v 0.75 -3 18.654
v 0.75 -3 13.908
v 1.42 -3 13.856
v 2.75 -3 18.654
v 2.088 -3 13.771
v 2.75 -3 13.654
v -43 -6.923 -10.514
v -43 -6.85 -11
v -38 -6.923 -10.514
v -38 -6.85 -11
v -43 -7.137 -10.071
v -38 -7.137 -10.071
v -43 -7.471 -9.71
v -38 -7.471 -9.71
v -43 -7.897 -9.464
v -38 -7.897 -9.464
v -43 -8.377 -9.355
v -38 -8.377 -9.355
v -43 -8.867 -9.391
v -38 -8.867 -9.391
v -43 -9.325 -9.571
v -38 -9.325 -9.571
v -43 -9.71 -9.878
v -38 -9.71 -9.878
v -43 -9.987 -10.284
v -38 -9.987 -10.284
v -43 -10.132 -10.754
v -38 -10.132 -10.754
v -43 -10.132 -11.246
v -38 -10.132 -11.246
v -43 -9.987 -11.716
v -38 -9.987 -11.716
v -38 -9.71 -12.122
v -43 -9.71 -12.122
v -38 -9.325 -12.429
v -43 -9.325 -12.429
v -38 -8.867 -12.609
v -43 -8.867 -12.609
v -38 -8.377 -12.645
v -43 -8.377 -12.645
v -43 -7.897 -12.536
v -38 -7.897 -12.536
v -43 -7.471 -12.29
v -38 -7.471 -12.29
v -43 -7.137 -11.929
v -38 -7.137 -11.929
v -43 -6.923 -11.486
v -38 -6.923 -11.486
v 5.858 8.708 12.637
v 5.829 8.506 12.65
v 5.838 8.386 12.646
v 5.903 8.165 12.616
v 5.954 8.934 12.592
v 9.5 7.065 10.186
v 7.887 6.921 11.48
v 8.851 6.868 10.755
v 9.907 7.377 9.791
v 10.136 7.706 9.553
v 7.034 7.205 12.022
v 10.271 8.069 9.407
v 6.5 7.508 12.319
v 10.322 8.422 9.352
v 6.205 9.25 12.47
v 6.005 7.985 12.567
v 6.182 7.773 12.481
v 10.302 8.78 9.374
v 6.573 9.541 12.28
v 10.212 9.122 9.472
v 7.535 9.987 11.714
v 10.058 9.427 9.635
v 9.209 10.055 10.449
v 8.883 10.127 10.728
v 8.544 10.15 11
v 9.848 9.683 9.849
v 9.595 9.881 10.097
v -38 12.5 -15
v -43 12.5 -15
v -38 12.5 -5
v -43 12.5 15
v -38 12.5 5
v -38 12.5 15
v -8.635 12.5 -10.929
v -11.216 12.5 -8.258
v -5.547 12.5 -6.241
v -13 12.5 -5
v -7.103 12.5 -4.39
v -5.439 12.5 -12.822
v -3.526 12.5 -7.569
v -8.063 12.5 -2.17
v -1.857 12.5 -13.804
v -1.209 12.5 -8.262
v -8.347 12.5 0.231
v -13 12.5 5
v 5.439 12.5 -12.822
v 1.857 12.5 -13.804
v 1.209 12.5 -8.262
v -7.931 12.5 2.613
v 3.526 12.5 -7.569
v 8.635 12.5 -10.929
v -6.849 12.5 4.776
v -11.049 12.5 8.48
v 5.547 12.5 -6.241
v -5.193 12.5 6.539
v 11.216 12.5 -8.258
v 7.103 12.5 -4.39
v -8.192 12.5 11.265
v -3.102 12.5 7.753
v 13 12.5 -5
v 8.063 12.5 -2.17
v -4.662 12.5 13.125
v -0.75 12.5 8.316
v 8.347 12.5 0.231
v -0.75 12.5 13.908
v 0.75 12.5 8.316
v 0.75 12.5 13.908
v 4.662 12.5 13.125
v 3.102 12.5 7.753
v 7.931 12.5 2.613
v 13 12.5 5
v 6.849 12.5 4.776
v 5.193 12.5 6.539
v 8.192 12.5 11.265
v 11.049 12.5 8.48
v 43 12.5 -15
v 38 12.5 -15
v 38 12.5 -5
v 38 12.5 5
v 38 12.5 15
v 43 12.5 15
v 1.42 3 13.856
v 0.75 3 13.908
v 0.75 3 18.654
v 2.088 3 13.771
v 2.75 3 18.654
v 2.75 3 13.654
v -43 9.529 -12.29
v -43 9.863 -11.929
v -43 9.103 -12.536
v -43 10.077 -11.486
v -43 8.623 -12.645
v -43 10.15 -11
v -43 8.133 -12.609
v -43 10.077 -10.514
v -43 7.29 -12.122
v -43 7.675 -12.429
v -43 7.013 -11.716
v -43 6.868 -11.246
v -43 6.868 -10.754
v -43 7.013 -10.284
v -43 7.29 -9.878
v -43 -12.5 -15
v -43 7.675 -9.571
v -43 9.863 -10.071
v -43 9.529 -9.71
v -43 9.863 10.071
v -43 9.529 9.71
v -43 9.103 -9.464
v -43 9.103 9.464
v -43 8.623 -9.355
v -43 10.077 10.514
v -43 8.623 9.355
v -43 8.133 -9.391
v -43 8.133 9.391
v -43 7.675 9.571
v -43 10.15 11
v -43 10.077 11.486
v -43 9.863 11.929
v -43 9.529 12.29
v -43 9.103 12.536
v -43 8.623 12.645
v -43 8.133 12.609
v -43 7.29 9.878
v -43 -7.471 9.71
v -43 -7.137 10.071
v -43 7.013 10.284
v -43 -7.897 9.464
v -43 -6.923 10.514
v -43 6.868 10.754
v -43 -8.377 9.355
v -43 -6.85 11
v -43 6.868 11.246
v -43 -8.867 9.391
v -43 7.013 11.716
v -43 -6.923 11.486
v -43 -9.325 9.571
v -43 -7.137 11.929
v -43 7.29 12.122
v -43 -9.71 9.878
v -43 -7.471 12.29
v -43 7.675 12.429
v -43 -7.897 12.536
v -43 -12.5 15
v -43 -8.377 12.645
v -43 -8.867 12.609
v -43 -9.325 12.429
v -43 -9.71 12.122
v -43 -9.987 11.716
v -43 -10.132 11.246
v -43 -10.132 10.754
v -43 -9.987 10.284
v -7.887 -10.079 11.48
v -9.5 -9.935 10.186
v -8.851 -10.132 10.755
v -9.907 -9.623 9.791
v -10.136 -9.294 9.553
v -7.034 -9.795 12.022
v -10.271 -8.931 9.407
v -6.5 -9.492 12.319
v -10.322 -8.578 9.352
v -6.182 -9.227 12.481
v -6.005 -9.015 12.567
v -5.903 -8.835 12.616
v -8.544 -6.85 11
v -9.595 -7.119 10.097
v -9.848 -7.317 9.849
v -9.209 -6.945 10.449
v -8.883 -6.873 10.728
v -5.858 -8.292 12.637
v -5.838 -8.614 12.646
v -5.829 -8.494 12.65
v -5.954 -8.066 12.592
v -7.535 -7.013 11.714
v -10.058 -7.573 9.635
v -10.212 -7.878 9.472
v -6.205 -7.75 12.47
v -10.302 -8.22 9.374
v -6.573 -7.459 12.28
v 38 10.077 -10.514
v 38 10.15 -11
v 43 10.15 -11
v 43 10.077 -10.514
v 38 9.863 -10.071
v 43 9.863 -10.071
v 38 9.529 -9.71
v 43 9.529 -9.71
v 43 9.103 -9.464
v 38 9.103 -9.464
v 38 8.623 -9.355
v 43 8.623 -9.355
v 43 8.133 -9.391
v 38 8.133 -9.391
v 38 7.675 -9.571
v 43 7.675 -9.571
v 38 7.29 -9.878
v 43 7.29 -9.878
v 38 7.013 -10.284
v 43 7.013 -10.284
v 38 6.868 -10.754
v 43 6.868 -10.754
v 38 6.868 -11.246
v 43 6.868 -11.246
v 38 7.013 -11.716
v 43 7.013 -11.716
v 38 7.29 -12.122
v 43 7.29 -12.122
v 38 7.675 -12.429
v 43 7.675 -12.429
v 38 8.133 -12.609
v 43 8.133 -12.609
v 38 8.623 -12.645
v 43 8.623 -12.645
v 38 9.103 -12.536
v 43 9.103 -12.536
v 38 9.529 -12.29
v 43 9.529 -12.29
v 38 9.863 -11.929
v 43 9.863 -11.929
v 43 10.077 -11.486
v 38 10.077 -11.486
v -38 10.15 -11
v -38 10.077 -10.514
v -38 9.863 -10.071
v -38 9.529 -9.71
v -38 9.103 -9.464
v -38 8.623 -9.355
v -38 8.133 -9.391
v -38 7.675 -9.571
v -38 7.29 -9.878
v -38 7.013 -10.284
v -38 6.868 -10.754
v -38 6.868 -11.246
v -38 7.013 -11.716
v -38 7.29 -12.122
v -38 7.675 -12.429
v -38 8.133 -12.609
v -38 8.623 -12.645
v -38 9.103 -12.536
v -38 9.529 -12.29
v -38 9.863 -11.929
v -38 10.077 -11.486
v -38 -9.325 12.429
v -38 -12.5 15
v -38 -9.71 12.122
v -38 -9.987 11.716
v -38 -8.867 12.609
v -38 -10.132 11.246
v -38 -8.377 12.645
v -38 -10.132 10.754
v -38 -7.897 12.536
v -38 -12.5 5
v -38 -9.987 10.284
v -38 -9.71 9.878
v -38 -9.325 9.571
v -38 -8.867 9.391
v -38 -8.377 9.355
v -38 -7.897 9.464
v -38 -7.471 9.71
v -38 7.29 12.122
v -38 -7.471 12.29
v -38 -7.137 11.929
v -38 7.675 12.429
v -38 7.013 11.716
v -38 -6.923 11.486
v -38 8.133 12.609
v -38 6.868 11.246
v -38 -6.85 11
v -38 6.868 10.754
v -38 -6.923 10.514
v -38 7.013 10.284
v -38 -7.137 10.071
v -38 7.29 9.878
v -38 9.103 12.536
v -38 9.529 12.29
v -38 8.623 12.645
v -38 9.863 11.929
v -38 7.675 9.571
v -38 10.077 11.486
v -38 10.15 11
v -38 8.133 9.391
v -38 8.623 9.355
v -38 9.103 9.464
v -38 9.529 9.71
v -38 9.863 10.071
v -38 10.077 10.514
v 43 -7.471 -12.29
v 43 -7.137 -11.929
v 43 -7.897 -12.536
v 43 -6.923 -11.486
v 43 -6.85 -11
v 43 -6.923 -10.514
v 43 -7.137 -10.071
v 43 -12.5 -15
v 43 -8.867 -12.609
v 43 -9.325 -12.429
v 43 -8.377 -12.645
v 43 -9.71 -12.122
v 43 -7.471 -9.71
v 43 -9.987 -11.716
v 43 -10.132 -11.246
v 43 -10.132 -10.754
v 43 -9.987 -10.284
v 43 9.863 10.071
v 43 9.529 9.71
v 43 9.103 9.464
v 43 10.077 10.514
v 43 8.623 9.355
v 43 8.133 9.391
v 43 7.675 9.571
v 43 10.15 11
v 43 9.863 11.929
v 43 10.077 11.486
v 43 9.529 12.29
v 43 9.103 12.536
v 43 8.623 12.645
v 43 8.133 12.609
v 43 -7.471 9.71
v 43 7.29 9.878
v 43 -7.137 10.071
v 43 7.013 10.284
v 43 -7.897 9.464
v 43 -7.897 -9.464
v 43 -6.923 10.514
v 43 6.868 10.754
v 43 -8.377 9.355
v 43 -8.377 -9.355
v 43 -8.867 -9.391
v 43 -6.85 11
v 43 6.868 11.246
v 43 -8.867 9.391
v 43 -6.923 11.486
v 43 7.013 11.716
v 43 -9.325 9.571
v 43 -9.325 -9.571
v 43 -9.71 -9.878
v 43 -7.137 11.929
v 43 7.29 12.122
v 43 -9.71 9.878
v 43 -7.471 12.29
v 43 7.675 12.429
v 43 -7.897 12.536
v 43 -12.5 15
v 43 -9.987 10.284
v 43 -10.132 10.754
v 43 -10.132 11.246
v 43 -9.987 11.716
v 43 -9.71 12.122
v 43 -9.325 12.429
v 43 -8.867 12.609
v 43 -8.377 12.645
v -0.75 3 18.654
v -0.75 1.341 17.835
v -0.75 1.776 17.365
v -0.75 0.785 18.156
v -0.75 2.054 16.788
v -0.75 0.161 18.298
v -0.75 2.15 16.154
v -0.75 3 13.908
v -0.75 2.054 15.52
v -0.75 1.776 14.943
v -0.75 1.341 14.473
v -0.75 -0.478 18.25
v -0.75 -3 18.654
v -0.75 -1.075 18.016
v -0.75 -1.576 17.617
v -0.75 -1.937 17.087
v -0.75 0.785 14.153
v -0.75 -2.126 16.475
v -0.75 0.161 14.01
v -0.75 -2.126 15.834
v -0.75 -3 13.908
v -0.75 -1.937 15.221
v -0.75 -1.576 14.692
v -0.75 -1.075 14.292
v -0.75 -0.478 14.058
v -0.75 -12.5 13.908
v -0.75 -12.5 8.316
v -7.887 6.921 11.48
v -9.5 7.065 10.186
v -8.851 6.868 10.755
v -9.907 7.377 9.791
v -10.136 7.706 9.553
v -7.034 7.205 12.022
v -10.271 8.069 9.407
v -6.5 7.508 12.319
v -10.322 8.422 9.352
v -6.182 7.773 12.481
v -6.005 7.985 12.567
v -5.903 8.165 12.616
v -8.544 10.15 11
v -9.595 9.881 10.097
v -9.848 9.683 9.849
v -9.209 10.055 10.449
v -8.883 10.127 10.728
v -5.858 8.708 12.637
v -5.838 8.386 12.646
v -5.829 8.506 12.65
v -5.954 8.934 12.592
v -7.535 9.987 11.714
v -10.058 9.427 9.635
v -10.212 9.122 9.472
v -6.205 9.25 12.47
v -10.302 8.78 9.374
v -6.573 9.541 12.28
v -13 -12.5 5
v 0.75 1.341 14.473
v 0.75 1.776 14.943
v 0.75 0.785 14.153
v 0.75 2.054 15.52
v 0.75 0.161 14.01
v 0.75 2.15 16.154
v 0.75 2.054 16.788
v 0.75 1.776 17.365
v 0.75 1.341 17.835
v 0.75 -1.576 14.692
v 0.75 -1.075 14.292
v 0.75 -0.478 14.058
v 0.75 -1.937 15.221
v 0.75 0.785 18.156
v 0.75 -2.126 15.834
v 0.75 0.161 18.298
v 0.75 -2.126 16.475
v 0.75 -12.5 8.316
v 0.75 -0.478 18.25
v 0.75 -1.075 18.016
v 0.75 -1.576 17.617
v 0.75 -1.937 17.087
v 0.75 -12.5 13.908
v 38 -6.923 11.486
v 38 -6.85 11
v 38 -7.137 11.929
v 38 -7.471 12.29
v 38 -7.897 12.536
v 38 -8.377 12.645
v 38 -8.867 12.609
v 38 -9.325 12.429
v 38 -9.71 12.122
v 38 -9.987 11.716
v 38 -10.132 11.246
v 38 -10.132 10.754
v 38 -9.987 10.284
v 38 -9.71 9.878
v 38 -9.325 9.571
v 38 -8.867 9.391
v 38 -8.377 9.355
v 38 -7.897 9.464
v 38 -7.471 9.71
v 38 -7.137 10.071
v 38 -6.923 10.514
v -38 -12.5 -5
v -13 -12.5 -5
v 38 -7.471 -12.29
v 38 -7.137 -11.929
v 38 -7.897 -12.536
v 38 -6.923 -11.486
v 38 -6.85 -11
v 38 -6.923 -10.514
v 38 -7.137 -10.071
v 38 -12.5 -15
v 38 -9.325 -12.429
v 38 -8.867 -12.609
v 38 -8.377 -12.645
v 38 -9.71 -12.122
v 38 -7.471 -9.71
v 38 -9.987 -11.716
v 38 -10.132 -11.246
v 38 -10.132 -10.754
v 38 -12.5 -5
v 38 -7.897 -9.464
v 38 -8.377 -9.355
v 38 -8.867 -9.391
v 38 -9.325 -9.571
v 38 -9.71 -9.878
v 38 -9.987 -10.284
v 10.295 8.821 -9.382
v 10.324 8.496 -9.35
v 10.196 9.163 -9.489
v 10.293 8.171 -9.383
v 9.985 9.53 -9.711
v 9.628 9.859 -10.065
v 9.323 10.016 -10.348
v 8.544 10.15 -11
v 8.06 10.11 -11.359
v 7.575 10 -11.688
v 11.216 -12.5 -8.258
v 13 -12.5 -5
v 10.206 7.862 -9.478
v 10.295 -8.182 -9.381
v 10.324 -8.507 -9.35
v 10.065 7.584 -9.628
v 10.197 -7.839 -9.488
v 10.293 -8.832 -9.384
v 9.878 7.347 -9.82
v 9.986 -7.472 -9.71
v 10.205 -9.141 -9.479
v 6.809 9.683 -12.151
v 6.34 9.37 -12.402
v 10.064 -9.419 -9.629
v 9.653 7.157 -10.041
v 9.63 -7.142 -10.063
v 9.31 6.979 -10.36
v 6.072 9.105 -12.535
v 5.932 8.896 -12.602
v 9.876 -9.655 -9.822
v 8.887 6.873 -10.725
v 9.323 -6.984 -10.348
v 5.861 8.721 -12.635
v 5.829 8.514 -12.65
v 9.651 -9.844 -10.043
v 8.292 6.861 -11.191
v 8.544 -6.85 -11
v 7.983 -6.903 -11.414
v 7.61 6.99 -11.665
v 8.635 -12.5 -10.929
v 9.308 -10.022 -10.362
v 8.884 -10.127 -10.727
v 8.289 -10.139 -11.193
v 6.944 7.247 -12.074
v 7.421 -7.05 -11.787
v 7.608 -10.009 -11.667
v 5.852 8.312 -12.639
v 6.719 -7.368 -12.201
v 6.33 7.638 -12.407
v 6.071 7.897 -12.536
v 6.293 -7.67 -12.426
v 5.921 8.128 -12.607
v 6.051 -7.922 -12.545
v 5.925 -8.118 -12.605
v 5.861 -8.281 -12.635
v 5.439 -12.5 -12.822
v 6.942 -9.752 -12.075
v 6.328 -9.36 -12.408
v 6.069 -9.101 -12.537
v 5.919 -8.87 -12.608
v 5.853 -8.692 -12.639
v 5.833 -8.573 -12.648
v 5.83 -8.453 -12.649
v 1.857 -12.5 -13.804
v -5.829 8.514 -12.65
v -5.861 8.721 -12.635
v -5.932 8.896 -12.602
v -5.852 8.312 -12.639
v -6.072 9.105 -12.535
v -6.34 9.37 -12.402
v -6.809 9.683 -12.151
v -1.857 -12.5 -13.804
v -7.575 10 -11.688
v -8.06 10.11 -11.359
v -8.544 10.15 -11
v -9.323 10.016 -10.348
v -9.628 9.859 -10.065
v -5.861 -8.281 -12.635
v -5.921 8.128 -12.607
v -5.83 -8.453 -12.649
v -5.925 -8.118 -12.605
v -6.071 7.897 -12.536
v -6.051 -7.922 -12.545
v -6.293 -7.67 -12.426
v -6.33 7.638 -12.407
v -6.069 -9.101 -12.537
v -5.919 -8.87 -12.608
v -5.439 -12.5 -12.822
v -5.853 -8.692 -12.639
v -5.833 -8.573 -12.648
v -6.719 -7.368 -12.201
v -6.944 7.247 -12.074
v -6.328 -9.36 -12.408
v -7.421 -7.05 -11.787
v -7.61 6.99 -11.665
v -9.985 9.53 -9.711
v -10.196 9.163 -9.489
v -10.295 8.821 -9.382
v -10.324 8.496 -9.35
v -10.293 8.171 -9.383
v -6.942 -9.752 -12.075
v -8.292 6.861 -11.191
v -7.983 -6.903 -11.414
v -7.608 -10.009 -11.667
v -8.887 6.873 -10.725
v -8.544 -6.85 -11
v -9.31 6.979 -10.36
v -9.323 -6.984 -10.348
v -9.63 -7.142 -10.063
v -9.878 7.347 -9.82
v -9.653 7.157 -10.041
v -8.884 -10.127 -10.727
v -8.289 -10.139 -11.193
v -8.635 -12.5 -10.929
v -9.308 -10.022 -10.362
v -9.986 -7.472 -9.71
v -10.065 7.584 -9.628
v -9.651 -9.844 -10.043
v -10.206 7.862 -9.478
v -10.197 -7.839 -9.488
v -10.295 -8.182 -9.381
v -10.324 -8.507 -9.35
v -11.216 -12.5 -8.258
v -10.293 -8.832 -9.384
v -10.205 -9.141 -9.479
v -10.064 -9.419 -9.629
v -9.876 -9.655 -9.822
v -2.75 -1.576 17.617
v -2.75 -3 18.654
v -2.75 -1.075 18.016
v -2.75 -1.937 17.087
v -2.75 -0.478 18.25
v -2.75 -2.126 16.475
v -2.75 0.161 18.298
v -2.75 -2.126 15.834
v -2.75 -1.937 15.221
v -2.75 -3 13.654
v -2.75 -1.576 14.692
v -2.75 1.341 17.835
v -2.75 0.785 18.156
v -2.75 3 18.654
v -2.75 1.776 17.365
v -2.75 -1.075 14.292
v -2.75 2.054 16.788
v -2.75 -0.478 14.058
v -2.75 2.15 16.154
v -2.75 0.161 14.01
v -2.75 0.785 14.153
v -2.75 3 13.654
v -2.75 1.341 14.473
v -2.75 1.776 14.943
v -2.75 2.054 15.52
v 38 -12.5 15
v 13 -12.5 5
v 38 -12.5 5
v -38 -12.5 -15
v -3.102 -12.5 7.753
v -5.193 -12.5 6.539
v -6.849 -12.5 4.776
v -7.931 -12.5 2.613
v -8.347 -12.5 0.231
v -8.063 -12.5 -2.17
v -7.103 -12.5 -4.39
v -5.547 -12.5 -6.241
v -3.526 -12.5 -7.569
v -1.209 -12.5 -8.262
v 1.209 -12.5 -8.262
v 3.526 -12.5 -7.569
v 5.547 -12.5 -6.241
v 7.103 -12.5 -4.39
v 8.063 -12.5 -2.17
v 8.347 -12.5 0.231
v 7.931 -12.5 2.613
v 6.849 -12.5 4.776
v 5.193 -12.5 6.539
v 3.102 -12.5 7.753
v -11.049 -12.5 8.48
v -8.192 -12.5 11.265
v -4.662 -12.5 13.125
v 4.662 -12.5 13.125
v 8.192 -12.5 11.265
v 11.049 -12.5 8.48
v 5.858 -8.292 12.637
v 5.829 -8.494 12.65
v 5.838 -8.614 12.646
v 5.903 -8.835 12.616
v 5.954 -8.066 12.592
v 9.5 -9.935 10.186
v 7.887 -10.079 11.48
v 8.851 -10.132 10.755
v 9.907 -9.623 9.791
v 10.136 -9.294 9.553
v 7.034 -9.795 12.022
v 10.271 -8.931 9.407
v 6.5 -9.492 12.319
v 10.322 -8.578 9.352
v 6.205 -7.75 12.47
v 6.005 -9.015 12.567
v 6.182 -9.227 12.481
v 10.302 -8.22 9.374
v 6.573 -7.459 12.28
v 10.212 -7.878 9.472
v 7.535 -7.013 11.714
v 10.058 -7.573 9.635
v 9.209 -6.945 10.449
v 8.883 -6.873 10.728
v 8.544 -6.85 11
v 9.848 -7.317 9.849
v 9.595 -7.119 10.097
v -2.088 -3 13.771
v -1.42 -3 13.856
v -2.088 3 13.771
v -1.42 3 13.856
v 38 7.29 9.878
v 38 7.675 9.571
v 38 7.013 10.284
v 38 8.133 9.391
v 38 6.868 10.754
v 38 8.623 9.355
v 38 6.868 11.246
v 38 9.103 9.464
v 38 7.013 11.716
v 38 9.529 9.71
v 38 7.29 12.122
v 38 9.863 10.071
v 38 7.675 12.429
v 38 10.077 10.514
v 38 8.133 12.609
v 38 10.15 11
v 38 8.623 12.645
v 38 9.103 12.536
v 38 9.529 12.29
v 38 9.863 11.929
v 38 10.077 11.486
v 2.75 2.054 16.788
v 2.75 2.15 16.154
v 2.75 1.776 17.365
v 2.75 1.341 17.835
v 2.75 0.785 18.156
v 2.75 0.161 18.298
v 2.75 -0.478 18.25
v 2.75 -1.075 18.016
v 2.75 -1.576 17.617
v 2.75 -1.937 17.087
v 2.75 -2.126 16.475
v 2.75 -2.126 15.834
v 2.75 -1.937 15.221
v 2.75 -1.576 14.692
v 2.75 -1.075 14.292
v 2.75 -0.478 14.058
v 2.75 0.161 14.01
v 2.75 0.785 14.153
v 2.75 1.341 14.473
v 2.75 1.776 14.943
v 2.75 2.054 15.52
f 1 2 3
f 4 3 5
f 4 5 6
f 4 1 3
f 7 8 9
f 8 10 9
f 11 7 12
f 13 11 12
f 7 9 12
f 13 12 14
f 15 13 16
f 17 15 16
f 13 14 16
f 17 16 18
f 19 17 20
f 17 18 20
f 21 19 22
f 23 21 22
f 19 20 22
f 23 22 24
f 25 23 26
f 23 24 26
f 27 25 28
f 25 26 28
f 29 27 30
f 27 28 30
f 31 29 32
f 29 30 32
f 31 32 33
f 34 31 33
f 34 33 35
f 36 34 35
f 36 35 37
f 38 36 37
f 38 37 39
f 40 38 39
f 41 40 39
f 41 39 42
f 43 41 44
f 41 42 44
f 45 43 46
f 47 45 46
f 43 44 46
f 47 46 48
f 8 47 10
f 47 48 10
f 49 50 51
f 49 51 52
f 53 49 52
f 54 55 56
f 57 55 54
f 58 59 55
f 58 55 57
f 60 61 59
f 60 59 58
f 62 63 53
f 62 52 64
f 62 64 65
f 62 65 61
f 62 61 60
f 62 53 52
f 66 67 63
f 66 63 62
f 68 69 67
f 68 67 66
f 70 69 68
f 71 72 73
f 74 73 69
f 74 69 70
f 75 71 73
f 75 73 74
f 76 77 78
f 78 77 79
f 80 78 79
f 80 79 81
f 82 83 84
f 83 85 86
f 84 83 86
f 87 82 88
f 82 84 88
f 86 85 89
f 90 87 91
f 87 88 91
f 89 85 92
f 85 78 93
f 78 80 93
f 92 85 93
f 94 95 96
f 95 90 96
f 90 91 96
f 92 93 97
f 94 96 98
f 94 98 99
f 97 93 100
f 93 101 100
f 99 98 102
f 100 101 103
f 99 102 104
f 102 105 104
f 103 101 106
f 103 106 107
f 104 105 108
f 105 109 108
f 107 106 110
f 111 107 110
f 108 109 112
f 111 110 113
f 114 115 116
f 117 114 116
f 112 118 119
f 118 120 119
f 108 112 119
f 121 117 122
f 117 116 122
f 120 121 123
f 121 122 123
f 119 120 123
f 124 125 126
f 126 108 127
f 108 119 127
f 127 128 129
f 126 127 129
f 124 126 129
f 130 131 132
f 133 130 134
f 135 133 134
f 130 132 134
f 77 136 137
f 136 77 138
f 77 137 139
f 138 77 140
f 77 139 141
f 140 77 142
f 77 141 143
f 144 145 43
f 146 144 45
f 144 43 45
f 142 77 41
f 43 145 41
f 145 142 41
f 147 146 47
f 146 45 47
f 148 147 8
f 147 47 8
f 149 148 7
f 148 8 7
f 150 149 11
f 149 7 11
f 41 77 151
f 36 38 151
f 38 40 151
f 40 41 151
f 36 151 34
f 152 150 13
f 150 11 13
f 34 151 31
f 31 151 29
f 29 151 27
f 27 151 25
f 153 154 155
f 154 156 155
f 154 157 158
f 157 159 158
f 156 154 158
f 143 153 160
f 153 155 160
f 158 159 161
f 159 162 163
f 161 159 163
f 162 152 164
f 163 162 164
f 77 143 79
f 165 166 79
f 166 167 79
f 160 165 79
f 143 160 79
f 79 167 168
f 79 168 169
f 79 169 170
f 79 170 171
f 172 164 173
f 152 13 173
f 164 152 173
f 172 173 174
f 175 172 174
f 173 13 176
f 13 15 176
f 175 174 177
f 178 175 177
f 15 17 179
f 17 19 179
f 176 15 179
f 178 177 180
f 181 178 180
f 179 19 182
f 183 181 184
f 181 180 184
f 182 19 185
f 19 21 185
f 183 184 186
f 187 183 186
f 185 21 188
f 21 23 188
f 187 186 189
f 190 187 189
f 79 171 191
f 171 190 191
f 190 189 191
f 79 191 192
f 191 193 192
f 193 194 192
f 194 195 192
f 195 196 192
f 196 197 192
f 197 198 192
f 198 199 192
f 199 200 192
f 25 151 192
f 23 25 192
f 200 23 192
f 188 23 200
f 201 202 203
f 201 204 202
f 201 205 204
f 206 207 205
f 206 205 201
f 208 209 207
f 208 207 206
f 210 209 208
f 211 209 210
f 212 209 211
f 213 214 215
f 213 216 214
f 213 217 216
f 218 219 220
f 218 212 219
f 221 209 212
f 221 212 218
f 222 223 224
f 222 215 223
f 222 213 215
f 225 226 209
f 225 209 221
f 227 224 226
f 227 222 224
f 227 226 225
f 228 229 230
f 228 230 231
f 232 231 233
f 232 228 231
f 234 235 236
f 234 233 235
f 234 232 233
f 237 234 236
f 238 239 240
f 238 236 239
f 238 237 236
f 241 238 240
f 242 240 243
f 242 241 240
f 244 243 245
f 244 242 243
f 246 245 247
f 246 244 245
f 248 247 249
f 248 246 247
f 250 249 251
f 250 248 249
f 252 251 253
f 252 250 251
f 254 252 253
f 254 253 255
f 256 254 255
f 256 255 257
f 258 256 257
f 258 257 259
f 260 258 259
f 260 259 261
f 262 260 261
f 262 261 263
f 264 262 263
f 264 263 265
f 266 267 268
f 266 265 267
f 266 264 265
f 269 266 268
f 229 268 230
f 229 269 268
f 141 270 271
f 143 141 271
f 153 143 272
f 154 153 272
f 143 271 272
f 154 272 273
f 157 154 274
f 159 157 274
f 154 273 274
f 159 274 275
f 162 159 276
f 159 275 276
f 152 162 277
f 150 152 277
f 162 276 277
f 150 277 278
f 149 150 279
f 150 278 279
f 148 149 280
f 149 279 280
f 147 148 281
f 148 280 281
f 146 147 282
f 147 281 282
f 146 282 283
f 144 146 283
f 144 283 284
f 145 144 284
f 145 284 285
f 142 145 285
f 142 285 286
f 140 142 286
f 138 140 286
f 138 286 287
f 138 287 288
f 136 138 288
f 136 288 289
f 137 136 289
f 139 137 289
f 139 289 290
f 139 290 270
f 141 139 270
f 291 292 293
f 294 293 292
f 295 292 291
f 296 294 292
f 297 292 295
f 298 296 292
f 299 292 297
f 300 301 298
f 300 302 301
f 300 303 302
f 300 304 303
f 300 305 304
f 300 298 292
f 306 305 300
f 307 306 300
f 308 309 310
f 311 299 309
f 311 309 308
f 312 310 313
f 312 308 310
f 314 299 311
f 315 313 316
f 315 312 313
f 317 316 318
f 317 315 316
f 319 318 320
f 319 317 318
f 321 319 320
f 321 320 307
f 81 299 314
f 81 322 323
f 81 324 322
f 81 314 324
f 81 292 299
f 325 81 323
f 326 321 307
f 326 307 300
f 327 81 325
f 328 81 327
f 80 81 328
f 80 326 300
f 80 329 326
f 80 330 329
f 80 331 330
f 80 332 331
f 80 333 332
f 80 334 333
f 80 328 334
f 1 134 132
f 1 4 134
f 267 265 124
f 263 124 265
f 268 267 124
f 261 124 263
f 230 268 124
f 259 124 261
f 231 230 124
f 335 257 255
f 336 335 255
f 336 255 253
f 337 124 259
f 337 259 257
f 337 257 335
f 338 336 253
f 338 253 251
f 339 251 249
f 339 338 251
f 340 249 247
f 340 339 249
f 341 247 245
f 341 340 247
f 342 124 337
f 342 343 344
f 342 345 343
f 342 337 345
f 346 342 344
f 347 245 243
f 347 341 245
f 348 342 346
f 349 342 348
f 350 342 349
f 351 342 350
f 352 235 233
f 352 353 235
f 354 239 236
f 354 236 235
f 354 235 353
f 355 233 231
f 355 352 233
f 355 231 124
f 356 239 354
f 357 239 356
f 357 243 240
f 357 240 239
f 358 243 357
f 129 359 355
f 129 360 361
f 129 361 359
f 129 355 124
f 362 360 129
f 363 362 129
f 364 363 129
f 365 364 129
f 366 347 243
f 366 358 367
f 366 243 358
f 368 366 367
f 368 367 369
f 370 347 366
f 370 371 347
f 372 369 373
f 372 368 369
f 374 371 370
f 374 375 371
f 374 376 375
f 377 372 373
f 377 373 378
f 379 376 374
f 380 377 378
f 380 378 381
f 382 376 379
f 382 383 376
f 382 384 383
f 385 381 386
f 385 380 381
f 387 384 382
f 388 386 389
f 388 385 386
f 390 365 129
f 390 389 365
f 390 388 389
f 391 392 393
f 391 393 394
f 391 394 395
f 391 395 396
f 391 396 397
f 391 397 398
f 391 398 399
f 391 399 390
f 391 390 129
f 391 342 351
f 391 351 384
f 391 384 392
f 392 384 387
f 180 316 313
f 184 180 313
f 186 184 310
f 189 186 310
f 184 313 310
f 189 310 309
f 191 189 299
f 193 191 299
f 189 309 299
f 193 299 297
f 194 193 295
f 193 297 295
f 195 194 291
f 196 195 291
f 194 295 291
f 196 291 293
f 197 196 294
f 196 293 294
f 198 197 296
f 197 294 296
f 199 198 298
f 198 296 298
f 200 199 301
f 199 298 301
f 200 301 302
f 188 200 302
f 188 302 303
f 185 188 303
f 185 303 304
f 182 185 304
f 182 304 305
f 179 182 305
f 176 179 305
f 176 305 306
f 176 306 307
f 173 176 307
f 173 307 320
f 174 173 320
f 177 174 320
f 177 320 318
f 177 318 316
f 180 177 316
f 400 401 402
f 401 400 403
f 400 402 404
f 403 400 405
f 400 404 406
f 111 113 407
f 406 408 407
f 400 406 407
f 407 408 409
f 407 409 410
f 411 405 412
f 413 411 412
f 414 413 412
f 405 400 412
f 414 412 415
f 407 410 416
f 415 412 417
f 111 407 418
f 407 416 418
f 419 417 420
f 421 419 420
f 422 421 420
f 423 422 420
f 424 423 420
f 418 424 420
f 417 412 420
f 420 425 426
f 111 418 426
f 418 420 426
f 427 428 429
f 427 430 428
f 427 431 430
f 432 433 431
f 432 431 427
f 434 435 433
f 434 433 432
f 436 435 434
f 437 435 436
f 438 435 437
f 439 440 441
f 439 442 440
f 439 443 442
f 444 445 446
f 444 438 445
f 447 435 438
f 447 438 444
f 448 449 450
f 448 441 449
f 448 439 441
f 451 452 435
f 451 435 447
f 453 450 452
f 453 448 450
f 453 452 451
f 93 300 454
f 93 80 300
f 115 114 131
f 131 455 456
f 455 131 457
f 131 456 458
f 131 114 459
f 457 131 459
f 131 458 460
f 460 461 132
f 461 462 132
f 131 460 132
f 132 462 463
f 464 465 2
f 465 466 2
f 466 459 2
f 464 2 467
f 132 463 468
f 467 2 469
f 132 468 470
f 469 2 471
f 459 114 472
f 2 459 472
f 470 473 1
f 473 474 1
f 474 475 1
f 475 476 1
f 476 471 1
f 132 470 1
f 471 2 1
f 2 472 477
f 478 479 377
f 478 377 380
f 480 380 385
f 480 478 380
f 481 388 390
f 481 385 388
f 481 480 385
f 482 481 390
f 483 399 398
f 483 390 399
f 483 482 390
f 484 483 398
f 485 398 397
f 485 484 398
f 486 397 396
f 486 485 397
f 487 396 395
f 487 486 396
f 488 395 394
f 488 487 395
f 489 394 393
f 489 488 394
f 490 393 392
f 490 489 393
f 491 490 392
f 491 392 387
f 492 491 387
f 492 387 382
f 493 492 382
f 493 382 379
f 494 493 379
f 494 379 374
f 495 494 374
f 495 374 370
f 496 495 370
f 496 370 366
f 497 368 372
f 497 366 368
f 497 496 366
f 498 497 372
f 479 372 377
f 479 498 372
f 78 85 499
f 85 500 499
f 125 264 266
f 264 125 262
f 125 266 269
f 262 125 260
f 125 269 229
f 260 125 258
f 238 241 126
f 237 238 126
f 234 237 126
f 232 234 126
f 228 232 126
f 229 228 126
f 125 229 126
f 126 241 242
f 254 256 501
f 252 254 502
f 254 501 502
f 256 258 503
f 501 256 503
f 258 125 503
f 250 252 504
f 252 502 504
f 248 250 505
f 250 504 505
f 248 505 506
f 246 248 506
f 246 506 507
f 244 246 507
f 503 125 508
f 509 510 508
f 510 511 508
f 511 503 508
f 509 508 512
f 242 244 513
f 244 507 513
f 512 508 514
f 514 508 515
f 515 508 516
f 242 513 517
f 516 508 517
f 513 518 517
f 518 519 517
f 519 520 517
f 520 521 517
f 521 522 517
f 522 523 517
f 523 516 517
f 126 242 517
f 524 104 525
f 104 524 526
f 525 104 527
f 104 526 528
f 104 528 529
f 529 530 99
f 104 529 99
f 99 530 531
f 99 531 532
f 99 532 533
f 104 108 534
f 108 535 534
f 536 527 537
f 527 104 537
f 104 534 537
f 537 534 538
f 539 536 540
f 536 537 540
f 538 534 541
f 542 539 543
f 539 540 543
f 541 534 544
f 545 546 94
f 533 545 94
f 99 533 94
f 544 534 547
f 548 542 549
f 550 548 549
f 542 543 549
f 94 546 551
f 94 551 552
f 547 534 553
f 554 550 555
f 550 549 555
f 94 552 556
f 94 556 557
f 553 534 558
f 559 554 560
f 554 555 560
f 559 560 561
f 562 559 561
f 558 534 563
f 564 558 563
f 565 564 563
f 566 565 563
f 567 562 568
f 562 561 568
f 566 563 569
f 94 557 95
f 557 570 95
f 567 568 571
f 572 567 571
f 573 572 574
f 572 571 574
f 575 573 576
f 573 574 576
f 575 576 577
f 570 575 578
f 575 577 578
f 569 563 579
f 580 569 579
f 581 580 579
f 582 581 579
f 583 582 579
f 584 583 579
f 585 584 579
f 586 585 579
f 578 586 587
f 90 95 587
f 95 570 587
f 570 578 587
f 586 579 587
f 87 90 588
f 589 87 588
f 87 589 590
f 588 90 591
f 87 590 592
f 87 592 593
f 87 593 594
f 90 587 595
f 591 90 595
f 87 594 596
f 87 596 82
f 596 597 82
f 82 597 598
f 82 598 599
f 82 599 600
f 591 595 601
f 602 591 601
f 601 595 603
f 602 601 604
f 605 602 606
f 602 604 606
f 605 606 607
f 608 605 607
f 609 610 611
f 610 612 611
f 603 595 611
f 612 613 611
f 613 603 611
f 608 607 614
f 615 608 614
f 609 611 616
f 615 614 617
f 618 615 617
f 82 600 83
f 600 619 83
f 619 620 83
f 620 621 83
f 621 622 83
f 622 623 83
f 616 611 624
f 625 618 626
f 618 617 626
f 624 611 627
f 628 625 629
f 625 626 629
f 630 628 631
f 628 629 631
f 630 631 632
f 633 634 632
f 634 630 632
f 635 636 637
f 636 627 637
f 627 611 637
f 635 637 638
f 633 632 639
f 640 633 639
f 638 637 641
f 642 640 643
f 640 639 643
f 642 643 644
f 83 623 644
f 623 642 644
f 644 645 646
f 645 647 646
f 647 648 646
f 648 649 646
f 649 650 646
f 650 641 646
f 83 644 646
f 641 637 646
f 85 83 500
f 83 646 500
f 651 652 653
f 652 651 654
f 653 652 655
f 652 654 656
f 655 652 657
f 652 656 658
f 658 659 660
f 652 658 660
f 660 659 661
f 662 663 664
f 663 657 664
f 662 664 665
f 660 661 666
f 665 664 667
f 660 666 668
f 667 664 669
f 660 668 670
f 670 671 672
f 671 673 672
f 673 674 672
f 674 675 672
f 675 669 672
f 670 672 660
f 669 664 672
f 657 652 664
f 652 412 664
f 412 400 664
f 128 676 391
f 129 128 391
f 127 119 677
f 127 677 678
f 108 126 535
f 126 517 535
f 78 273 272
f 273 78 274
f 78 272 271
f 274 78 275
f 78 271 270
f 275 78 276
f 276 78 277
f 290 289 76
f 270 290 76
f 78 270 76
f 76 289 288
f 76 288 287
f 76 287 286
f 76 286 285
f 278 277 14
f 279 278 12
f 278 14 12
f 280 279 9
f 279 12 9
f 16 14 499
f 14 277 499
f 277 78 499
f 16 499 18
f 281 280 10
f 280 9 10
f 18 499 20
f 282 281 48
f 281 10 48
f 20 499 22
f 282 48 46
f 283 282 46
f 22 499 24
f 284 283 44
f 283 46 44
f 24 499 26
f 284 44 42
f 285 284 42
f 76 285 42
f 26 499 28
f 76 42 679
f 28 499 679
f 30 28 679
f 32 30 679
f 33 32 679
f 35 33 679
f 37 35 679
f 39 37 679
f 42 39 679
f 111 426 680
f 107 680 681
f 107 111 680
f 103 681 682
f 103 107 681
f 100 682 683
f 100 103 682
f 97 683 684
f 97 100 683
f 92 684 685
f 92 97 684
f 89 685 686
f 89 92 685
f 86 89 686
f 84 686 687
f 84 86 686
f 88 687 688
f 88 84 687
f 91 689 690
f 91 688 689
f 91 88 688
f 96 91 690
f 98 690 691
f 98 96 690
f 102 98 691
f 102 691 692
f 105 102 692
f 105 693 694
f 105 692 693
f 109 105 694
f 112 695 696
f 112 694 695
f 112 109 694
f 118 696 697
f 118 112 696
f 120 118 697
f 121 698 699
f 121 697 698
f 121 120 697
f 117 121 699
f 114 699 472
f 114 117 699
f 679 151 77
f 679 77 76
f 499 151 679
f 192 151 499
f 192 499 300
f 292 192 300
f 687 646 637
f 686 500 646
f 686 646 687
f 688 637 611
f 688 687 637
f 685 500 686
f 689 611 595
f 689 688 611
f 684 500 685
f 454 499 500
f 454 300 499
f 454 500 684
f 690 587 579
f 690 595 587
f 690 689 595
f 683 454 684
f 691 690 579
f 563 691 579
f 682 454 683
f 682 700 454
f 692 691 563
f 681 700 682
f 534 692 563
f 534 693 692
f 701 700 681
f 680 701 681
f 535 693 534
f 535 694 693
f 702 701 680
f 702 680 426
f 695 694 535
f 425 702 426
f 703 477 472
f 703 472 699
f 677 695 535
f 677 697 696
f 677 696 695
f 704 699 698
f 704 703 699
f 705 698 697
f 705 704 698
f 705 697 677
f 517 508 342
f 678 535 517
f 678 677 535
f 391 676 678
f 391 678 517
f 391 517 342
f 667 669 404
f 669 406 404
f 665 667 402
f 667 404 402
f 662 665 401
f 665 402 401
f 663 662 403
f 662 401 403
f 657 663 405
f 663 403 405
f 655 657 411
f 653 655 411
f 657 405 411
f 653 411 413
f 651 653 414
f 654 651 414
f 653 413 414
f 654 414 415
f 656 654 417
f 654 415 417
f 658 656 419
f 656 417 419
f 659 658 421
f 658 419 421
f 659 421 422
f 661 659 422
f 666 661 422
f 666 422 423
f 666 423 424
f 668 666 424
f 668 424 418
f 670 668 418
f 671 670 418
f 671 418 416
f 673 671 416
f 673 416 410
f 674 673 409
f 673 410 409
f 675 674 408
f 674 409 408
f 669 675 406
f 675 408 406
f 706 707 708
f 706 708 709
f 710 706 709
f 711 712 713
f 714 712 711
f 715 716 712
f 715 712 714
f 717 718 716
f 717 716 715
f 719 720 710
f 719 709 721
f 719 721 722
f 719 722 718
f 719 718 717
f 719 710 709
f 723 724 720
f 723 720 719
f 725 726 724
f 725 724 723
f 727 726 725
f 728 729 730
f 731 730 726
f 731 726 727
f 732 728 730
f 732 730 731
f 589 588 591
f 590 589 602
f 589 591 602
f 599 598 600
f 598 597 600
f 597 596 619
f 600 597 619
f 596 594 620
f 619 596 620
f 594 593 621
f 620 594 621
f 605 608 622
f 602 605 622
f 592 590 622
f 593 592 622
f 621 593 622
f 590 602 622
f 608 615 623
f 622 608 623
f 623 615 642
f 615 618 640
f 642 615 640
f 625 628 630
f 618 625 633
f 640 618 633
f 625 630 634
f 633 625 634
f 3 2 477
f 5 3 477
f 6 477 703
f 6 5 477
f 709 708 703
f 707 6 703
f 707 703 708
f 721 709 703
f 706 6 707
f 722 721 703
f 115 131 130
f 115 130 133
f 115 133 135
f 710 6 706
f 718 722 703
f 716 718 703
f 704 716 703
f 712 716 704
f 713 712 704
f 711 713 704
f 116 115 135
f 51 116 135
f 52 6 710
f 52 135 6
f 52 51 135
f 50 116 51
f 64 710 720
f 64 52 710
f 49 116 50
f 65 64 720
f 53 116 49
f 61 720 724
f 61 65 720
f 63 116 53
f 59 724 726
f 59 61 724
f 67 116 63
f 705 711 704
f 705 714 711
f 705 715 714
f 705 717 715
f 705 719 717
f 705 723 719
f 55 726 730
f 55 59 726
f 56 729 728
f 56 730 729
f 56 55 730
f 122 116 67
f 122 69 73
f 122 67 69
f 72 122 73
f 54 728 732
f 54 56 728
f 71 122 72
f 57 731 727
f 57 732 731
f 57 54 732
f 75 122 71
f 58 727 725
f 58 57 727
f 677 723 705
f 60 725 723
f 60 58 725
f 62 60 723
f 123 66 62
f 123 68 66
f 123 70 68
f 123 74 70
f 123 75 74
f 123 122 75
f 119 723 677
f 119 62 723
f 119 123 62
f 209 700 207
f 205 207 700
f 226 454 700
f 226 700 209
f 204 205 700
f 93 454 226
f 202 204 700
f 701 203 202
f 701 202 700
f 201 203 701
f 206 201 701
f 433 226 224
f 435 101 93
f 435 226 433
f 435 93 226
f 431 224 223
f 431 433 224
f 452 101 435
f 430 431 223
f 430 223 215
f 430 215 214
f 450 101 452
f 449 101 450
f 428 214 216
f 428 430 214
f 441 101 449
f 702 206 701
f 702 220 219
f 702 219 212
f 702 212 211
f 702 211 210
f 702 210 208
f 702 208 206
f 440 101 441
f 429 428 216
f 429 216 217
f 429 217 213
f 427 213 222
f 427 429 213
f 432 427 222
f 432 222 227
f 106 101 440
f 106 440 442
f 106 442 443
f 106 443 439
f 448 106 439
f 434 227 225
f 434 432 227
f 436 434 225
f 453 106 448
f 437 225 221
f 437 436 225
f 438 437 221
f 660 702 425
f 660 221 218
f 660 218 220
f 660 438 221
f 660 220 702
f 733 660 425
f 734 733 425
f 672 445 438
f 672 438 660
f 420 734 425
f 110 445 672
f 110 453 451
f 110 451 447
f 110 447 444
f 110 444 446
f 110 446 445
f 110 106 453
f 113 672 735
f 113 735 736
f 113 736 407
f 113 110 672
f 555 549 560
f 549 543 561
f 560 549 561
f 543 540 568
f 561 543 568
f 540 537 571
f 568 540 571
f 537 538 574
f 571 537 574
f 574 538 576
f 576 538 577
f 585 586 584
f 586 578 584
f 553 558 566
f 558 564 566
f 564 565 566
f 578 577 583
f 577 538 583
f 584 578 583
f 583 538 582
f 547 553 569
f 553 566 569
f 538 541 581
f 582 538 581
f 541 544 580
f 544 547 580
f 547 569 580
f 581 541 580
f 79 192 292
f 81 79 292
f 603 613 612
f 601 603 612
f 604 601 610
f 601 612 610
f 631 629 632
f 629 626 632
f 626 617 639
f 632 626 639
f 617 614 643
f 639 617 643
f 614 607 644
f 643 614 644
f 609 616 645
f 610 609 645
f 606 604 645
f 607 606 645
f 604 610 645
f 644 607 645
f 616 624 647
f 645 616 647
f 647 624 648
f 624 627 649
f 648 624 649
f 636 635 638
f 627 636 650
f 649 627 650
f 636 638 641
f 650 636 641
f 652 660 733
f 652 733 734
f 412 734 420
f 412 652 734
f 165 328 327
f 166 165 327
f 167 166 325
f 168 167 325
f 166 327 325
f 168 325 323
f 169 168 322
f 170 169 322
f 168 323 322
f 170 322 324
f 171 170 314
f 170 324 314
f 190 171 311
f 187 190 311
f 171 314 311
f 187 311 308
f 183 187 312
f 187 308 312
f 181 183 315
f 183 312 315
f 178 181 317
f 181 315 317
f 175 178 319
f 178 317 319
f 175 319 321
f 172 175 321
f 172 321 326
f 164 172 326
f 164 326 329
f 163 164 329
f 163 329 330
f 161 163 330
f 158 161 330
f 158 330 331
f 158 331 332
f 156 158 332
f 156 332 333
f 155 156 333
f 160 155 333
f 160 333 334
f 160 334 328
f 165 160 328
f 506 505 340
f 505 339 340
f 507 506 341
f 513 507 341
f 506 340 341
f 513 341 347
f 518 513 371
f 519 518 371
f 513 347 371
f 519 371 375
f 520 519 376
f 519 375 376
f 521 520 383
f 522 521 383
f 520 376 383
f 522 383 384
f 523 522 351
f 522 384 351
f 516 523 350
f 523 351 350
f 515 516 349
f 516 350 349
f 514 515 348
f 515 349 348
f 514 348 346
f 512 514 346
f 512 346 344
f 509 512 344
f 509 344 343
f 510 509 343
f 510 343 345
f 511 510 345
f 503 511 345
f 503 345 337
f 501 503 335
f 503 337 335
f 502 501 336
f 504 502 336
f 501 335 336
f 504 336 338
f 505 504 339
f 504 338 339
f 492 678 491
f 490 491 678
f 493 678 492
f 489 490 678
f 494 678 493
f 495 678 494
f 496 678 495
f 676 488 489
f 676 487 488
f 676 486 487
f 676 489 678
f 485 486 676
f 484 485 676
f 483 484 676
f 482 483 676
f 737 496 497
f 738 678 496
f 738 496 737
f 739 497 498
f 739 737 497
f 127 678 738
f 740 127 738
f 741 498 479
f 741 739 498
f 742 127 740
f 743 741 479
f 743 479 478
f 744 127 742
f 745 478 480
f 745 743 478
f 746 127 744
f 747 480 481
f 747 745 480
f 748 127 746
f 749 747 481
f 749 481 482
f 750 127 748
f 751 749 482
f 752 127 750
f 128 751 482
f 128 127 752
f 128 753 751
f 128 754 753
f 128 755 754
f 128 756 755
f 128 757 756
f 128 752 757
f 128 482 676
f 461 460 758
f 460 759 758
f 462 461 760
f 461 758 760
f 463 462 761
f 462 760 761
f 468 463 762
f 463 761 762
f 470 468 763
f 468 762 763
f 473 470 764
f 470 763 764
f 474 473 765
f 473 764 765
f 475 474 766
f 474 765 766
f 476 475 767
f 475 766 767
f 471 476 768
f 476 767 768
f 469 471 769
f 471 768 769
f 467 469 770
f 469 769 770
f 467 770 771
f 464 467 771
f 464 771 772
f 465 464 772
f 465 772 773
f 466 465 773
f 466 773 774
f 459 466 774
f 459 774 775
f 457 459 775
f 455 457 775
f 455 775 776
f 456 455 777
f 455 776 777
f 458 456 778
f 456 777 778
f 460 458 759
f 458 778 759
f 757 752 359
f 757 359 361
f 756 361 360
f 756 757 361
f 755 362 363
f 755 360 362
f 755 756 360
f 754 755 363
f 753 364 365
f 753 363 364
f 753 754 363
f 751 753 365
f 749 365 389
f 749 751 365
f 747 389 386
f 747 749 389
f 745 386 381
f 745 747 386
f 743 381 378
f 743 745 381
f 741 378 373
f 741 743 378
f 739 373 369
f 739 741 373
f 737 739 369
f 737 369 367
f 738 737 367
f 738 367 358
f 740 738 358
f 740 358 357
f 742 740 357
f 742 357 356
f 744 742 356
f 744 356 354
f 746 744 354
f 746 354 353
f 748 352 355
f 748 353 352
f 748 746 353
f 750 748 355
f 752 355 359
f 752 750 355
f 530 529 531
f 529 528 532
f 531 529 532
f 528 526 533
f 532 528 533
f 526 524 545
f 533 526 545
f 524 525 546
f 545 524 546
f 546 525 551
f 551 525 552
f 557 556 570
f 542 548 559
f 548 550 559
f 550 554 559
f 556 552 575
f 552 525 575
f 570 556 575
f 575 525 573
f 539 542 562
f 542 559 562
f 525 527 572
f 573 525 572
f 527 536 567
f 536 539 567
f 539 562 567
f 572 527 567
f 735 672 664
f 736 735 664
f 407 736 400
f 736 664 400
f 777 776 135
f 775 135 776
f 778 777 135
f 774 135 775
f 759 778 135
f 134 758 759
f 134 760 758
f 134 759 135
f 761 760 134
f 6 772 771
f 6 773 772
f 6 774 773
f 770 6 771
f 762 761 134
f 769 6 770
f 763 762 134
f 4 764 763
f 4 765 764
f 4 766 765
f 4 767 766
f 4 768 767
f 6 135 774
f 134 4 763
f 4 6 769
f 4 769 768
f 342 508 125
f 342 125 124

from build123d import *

# Parameters (mm, degrees)
F0_W      = 86
F0_H      = 30
F0_R      = 8.35
F1_DEPTH  = 12.5
F3_DEPTH  = 12.5
F4_R      = 1.65
F5_DEPTH  = 65
F6_R      = 1.65
F7_DEPTH  = 12.5
F9_DEPTH  = 12.5
F11_DEPTH = 12.5
F13_DEPTH = 3
F14_R     = 2.15
F15_DEPTH = 12.5


with BuildPart() as f1:
    # F0 (on Front) → F1 (new body, symmetric)
    with BuildSketch(Plane.XZ):
        Rectangle(F0_W, F0_H)
        Circle(F0_R, mode=Mode.SUBTRACT)
    extrude(amount=F1_DEPTH, both=True)

    # F2 (on Front) → F3 (cut, symmetric)
    with BuildSketch(Plane.XZ):
        with BuildLine():
            Line((38, 15), (-38, 15))
            Line((-38, 15), (-38, 5))
            Line((-38, 5), (-13, 5))
            ThreePointArc((-13, 5), (0, 13.9283882772), (13, 5))
            Line((13, 5), (38, 5))
            Line((38, 5), (38, 15))
        make_face()
        with BuildLine():
            Line((-13, -5), (-38, -5))
            Line((-38, -5), (-38, -15))
            Line((-38, -15), (38, -15))
            Line((38, -15), (38, -5))
            Line((38, -5), (13, -5))
            ThreePointArc((13, -5), (0, -13.9283882772), (-13, -5))
        make_face()
    extrude(amount=F3_DEPTH, both=True, mode=Mode.SUBTRACT)

    # F4 (on Right) → F5 (cut, symmetric)
    with BuildSketch(Plane.YZ):
        with Locations((8.5, 11)):
            Circle(F4_R)
        with Locations((8.5, -11)):
            Circle(F4_R)
        with Locations((-8.5, 11)):
            Circle(F4_R)
        with Locations((-8.5, -11)):
            Circle(F4_R)
    extrude(amount=F5_DEPTH, both=True, mode=Mode.SUBTRACT)

    # F6 (on Right) → F7 (join, symmetric)
    with BuildSketch(Plane.YZ):
        with Locations((8.5, 11)):
            Circle(F6_R)
        with Locations((8.5, -11)):
            Circle(F6_R)
        with Locations((-8.5, 11)):
            Circle(F6_R)
        with Locations((-8.5, -11)):
            Circle(F6_R)
    extrude(amount=F7_DEPTH, both=True)

    # F8 (on Front) → F9 (cut, symmetric)
    with BuildSketch(Plane.XZ):
        with BuildLine():
            Line((38, 15), (-38, 15))
            Line((-38, 15), (-38, 5))
            Line((-38, 5), (-13, 5))
            ThreePointArc((-13, 5), (0, 13.9283882772), (13, 5))
            Line((13, 5), (38, 5))
            Line((38, 5), (38, 15))
        make_face()
        with BuildLine():
            Line((-13, -5), (-38, -5))
            Line((-38, -5), (-38, -15))
            Line((-38, -15), (38, -15))
            Line((38, -15), (38, -5))
            Line((38, -5), (13, -5))
            ThreePointArc((13, -5), (0, -13.9283882772), (-13, -5))
        make_face()
    extrude(amount=F9_DEPTH, both=True, mode=Mode.SUBTRACT)

    # F10 (on Front) → F11 (cut, symmetric)
    with BuildSketch(Plane.XZ):
        with BuildLine():
            ThreePointArc((0.75, 13.9081810457), (0, 14.6581810457), (-0.75, 13.9081810457))
            Line((-0.75, 13.9081810457), (-0.75, 8.3162491545))
            ThreePointArc((-0.75, 8.3162491545), (0, 7.5662491545), (0.75, 8.3162491545))
            Line((0.75, 8.3162491545), (0.75, 13.9081810457))
        make_face()
    extrude(amount=F11_DEPTH, both=True, mode=Mode.SUBTRACT)

    # F12 (on Front) → F13 (join, symmetric)
    with BuildSketch(Plane.XZ):
        with BuildLine():
            Line((-0.75, 13.9081810457), (-0.75, 18.6542118044))
            Line((-0.75, 18.6542118044), (-2.75, 18.6542118044))
            Line((-2.75, 18.6542118044), (-2.75, 13.6542118044))
            ThreePointArc((-2.75, 13.6542118044), (-1.754601121, 13.8174301122), (-0.75, 13.9081810457))
        make_face()
        with BuildLine():
            Line((0.75, 18.6542118044), (0.75, 13.9081810457))
            ThreePointArc((0.75, 13.9081810457), (1.754601121, 13.8174301122), (2.75, 13.6542118044))
            Line((2.75, 13.6542118044), (2.75, 18.6542118044))
            Line((2.75, 18.6542118044), (0.75, 18.6542118044))
        make_face()
    extrude(amount=F13_DEPTH, both=True)

    # F14 (on Right) → F15 (cut, symmetric)
    with BuildSketch(Plane.YZ):
        with Locations((0, 16.1542118044)):
            Circle(F14_R)
    extrude(amount=F15_DEPTH, both=True, mode=Mode.SUBTRACT)


solid = f1.part
